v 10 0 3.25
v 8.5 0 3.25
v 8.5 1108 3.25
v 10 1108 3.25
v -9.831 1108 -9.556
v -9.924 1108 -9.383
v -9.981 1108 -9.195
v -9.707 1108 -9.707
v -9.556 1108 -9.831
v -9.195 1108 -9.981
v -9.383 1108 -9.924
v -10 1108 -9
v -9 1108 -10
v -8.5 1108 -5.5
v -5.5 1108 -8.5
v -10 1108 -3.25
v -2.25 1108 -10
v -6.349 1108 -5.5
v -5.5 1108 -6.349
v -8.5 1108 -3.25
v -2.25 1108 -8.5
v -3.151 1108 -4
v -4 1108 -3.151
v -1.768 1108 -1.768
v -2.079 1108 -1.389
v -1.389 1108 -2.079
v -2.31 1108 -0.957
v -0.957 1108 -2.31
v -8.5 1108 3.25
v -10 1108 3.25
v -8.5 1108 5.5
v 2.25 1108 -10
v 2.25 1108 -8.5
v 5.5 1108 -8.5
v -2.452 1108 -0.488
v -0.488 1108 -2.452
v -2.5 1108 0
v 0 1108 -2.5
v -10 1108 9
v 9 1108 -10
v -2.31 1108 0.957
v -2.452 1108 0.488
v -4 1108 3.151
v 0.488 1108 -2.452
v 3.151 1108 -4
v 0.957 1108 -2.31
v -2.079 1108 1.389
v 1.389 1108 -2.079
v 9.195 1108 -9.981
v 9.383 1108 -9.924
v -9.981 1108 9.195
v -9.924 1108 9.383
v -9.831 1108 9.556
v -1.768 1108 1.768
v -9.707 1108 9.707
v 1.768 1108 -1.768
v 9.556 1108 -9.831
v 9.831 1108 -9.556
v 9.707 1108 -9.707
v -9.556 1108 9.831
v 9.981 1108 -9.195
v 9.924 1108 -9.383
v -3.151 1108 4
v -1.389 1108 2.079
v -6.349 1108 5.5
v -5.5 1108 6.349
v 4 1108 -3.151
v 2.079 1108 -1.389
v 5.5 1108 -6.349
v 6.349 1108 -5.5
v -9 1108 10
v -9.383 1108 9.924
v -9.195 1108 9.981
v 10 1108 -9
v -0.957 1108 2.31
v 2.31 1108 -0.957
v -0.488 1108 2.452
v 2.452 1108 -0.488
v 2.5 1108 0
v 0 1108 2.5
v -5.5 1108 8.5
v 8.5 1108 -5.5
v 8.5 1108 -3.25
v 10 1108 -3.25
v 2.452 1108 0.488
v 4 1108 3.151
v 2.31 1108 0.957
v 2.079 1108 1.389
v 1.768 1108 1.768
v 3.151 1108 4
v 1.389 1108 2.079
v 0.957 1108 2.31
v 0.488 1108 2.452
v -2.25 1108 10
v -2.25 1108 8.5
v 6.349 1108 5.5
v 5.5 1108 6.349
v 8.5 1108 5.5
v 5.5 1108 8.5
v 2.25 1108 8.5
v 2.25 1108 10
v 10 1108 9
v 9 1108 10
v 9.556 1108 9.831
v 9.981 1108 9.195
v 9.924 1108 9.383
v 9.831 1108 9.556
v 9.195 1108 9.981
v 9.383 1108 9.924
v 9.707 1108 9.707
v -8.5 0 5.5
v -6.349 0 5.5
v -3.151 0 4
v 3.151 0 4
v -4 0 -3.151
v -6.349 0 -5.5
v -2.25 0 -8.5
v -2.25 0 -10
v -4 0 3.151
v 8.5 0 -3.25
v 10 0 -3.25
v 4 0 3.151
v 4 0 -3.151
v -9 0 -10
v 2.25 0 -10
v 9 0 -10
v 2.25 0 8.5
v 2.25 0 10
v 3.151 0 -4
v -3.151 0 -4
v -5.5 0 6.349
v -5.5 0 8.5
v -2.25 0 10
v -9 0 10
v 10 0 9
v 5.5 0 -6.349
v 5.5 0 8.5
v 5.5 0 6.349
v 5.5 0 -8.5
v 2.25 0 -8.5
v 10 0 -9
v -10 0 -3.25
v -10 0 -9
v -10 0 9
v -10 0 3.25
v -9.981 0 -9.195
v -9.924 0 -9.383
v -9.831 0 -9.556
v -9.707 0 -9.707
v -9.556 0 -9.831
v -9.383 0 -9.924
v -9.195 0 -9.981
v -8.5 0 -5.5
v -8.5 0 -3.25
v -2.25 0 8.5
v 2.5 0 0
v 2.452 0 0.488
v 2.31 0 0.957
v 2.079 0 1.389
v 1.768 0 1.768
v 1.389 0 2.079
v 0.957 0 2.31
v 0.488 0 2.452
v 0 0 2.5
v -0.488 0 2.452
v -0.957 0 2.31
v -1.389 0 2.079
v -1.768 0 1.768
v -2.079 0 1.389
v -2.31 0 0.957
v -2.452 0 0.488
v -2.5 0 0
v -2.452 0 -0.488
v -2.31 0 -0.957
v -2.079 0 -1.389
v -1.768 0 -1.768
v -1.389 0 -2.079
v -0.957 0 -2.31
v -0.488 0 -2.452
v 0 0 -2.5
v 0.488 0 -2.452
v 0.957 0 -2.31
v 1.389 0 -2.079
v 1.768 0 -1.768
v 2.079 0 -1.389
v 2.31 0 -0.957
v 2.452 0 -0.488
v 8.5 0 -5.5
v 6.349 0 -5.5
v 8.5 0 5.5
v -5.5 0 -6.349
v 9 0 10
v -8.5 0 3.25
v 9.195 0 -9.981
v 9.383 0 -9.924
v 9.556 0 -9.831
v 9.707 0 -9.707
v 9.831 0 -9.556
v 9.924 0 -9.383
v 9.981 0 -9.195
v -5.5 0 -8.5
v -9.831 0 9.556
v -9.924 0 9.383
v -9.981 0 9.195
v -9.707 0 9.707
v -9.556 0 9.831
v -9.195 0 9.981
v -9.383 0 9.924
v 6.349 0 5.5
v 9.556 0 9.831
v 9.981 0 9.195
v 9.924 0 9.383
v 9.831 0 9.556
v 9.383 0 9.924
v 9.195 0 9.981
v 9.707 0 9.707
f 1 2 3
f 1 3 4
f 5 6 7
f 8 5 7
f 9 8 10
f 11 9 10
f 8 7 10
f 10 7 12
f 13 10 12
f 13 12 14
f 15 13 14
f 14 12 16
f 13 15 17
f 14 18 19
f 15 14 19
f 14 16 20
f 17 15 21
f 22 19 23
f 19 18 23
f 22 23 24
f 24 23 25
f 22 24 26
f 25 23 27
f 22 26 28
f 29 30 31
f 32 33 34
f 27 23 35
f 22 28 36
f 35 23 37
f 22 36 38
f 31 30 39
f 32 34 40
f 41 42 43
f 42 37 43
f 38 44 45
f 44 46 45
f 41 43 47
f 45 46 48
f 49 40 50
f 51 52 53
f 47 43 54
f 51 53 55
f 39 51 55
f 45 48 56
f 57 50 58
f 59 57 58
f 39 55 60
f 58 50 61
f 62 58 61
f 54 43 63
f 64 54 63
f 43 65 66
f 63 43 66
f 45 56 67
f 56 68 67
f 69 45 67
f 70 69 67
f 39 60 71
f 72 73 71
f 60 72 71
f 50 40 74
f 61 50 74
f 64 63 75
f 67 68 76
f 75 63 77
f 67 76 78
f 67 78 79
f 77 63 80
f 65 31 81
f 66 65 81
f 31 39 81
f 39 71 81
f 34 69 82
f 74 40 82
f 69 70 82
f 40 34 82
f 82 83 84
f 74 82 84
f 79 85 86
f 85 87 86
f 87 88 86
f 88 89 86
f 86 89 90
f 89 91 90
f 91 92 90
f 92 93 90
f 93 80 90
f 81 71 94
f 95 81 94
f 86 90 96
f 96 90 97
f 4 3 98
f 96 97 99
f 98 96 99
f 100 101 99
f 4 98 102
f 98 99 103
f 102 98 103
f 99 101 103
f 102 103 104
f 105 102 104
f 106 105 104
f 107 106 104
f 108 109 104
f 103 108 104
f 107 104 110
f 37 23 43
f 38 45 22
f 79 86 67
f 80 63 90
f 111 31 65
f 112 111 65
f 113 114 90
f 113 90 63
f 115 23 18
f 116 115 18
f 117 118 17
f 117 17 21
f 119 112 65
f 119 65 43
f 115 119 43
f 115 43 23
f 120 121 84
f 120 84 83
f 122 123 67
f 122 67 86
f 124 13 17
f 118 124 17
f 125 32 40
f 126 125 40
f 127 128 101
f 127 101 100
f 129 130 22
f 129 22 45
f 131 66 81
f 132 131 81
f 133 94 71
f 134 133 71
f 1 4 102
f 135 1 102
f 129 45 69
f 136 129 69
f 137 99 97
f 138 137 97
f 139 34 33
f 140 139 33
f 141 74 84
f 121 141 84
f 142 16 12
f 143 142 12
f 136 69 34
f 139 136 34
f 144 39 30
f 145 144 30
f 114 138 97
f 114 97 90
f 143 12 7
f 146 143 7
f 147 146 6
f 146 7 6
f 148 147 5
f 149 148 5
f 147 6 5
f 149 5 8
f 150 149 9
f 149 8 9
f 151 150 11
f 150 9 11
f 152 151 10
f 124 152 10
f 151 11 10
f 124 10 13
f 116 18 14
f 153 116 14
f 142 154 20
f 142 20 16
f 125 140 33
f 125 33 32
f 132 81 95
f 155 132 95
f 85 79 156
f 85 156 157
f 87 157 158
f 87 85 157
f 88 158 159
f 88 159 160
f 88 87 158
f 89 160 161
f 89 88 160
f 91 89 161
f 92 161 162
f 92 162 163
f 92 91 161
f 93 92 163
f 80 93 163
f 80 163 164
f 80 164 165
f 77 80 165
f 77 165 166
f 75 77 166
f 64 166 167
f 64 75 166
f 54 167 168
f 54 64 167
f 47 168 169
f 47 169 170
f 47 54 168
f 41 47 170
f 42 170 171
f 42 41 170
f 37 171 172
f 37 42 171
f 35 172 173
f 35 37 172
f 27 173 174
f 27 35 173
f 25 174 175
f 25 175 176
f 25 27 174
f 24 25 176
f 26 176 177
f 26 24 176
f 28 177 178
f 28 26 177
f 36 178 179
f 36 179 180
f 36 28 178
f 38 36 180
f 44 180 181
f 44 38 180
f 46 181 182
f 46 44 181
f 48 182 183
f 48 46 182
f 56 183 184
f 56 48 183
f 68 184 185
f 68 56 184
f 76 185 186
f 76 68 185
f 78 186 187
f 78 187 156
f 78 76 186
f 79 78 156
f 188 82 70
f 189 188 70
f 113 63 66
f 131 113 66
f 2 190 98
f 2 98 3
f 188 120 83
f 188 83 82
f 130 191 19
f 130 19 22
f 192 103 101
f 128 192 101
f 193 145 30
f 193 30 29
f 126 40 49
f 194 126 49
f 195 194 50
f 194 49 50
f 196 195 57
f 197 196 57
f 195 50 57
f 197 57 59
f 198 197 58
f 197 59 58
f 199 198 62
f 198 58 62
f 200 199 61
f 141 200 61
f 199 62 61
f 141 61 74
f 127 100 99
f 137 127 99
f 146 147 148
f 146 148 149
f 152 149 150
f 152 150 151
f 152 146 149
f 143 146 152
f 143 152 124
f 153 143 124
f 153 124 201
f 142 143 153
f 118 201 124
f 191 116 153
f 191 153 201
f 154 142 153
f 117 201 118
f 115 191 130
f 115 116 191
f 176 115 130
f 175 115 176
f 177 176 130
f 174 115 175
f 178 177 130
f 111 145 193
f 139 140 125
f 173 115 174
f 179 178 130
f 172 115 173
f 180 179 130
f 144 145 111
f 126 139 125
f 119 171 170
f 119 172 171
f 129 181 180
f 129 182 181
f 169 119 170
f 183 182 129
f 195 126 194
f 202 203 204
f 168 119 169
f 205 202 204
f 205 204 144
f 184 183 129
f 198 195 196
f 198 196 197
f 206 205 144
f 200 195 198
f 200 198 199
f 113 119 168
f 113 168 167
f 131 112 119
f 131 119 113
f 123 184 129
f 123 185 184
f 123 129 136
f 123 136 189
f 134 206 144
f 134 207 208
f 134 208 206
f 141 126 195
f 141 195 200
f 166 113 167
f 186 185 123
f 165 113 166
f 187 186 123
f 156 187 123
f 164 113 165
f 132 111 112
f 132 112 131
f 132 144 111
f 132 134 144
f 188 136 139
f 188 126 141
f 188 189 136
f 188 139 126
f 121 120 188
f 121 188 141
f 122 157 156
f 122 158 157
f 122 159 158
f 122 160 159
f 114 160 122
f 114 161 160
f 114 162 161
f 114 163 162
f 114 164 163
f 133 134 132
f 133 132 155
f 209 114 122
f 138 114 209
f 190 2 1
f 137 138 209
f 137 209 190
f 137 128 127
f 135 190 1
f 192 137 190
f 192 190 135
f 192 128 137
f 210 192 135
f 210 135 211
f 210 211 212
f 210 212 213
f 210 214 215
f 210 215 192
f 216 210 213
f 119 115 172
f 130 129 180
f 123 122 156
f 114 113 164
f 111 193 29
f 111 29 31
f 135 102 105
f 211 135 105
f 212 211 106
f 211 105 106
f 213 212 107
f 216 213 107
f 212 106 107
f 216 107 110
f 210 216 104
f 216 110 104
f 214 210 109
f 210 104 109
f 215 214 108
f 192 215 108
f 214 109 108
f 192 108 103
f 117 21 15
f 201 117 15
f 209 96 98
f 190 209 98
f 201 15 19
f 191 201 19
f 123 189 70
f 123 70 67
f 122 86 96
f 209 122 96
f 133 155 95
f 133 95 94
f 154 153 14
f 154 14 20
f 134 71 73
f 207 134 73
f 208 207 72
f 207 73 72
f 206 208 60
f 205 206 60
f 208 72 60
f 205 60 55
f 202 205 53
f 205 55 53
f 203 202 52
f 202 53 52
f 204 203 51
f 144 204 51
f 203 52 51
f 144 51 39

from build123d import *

# Parameters (mm, degrees)
SKETCH_11_R           = 2.5
F_20_X_20_X_2_1_DEPTH = 1108


with BuildPart() as part:
    # 草图11 → 铝型材 20 X 20 X 2(1) (new body)
    with BuildSketch(Plane.XZ.offset(-1108)):
        with BuildLine():
            Line((-10, 9), (-10, 3.25))
            Line((-10, 3.25), (-8.5, 3.25))
            Line((-8.5, 3.25), (-8.5, 5.5))
            Line((-8.5, 5.5), (-6.348528137, 5.5))
            Line((-6.348528137, 5.5), (-4, 3.151471863))
            Line((-4, 3.151471863), (-4, -3.151471863))
            Line((-4, -3.151471863), (-6.348528137, -5.5))
            Line((-6.348528137, -5.5), (-8.5, -5.5))
            Line((-8.5, -5.5), (-8.5, -3.25))
            Line((-8.5, -3.25), (-10, -3.25))
            Line((-10, -3.25), (-10, -9))
            ThreePointArc((-10, -9), (-9.707106781, -9.707106781), (-9, -10))
            Line((-9, -10), (-2.25, -10))
            Line((-2.25, -10), (-2.25, -8.5))
            Line((-2.25, -8.5), (-5.5, -8.5))
            Line((-5.5, -8.5), (-5.5, -6.348528137))
            Line((-5.5, -6.348528137), (-3.151471863, -4))
            Line((-3.151471863, -4), (3.151471863, -4))
            Line((3.151471863, -4), (5.5, -6.348528137))
            Line((5.5, -6.348528137), (5.5, -8.5))
            Line((5.5, -8.5), (2.25, -8.5))
            Line((2.25, -8.5), (2.25, -10))
            Line((2.25, -10), (9, -10))
            ThreePointArc((9, -10), (9.707106781, -9.707106781), (10, -9))
            Line((10, -9), (10, -3.25))
            Line((10, -3.25), (8.5, -3.25))
            Line((8.5, -3.25), (8.5, -5.5))
            Line((8.5, -5.5), (6.348528137, -5.5))
            Line((6.348528137, -5.5), (4, -3.151471863))
            Line((4, -3.151471863), (4, 3.151471863))
            Line((4, 3.151471863), (6.348528137, 5.5))
            Line((6.348528137, 5.5), (8.5, 5.5))
            Line((8.5, 5.5), (8.5, 3.25))
            Line((8.5, 3.25), (10, 3.25))
            Line((10, 3.25), (10, 9))
            ThreePointArc((10, 9), (9.707106781, 9.707106781), (9, 10))
            Line((9, 10), (2.25, 10))
            Line((2.25, 10), (2.25, 8.5))
            Line((2.25, 8.5), (5.5, 8.5))
            Line((5.5, 8.5), (5.5, 6.348528137))
            Line((5.5, 6.348528137), (3.151471863, 4))
            Line((3.151471863, 4), (-3.151471863, 4))
            Line((-3.151471863, 4), (-5.5, 6.348528137))
            Line((-5.5, 6.348528137), (-5.5, 8.5))
            Line((-5.5, 8.5), (-2.25, 8.5))
            Line((-2.25, 8.5), (-2.25, 10))
            Line((-2.25, 10), (-9, 10))
            ThreePointArc((-9, 10), (-9.707106781, 9.707106781), (-10, 9))
        make_face()
        Circle(SKETCH_11_R, mode=Mode.SUBTRACT)
    extrude(amount=F_20_X_20_X_2_1_DEPTH)


solid = part.part
